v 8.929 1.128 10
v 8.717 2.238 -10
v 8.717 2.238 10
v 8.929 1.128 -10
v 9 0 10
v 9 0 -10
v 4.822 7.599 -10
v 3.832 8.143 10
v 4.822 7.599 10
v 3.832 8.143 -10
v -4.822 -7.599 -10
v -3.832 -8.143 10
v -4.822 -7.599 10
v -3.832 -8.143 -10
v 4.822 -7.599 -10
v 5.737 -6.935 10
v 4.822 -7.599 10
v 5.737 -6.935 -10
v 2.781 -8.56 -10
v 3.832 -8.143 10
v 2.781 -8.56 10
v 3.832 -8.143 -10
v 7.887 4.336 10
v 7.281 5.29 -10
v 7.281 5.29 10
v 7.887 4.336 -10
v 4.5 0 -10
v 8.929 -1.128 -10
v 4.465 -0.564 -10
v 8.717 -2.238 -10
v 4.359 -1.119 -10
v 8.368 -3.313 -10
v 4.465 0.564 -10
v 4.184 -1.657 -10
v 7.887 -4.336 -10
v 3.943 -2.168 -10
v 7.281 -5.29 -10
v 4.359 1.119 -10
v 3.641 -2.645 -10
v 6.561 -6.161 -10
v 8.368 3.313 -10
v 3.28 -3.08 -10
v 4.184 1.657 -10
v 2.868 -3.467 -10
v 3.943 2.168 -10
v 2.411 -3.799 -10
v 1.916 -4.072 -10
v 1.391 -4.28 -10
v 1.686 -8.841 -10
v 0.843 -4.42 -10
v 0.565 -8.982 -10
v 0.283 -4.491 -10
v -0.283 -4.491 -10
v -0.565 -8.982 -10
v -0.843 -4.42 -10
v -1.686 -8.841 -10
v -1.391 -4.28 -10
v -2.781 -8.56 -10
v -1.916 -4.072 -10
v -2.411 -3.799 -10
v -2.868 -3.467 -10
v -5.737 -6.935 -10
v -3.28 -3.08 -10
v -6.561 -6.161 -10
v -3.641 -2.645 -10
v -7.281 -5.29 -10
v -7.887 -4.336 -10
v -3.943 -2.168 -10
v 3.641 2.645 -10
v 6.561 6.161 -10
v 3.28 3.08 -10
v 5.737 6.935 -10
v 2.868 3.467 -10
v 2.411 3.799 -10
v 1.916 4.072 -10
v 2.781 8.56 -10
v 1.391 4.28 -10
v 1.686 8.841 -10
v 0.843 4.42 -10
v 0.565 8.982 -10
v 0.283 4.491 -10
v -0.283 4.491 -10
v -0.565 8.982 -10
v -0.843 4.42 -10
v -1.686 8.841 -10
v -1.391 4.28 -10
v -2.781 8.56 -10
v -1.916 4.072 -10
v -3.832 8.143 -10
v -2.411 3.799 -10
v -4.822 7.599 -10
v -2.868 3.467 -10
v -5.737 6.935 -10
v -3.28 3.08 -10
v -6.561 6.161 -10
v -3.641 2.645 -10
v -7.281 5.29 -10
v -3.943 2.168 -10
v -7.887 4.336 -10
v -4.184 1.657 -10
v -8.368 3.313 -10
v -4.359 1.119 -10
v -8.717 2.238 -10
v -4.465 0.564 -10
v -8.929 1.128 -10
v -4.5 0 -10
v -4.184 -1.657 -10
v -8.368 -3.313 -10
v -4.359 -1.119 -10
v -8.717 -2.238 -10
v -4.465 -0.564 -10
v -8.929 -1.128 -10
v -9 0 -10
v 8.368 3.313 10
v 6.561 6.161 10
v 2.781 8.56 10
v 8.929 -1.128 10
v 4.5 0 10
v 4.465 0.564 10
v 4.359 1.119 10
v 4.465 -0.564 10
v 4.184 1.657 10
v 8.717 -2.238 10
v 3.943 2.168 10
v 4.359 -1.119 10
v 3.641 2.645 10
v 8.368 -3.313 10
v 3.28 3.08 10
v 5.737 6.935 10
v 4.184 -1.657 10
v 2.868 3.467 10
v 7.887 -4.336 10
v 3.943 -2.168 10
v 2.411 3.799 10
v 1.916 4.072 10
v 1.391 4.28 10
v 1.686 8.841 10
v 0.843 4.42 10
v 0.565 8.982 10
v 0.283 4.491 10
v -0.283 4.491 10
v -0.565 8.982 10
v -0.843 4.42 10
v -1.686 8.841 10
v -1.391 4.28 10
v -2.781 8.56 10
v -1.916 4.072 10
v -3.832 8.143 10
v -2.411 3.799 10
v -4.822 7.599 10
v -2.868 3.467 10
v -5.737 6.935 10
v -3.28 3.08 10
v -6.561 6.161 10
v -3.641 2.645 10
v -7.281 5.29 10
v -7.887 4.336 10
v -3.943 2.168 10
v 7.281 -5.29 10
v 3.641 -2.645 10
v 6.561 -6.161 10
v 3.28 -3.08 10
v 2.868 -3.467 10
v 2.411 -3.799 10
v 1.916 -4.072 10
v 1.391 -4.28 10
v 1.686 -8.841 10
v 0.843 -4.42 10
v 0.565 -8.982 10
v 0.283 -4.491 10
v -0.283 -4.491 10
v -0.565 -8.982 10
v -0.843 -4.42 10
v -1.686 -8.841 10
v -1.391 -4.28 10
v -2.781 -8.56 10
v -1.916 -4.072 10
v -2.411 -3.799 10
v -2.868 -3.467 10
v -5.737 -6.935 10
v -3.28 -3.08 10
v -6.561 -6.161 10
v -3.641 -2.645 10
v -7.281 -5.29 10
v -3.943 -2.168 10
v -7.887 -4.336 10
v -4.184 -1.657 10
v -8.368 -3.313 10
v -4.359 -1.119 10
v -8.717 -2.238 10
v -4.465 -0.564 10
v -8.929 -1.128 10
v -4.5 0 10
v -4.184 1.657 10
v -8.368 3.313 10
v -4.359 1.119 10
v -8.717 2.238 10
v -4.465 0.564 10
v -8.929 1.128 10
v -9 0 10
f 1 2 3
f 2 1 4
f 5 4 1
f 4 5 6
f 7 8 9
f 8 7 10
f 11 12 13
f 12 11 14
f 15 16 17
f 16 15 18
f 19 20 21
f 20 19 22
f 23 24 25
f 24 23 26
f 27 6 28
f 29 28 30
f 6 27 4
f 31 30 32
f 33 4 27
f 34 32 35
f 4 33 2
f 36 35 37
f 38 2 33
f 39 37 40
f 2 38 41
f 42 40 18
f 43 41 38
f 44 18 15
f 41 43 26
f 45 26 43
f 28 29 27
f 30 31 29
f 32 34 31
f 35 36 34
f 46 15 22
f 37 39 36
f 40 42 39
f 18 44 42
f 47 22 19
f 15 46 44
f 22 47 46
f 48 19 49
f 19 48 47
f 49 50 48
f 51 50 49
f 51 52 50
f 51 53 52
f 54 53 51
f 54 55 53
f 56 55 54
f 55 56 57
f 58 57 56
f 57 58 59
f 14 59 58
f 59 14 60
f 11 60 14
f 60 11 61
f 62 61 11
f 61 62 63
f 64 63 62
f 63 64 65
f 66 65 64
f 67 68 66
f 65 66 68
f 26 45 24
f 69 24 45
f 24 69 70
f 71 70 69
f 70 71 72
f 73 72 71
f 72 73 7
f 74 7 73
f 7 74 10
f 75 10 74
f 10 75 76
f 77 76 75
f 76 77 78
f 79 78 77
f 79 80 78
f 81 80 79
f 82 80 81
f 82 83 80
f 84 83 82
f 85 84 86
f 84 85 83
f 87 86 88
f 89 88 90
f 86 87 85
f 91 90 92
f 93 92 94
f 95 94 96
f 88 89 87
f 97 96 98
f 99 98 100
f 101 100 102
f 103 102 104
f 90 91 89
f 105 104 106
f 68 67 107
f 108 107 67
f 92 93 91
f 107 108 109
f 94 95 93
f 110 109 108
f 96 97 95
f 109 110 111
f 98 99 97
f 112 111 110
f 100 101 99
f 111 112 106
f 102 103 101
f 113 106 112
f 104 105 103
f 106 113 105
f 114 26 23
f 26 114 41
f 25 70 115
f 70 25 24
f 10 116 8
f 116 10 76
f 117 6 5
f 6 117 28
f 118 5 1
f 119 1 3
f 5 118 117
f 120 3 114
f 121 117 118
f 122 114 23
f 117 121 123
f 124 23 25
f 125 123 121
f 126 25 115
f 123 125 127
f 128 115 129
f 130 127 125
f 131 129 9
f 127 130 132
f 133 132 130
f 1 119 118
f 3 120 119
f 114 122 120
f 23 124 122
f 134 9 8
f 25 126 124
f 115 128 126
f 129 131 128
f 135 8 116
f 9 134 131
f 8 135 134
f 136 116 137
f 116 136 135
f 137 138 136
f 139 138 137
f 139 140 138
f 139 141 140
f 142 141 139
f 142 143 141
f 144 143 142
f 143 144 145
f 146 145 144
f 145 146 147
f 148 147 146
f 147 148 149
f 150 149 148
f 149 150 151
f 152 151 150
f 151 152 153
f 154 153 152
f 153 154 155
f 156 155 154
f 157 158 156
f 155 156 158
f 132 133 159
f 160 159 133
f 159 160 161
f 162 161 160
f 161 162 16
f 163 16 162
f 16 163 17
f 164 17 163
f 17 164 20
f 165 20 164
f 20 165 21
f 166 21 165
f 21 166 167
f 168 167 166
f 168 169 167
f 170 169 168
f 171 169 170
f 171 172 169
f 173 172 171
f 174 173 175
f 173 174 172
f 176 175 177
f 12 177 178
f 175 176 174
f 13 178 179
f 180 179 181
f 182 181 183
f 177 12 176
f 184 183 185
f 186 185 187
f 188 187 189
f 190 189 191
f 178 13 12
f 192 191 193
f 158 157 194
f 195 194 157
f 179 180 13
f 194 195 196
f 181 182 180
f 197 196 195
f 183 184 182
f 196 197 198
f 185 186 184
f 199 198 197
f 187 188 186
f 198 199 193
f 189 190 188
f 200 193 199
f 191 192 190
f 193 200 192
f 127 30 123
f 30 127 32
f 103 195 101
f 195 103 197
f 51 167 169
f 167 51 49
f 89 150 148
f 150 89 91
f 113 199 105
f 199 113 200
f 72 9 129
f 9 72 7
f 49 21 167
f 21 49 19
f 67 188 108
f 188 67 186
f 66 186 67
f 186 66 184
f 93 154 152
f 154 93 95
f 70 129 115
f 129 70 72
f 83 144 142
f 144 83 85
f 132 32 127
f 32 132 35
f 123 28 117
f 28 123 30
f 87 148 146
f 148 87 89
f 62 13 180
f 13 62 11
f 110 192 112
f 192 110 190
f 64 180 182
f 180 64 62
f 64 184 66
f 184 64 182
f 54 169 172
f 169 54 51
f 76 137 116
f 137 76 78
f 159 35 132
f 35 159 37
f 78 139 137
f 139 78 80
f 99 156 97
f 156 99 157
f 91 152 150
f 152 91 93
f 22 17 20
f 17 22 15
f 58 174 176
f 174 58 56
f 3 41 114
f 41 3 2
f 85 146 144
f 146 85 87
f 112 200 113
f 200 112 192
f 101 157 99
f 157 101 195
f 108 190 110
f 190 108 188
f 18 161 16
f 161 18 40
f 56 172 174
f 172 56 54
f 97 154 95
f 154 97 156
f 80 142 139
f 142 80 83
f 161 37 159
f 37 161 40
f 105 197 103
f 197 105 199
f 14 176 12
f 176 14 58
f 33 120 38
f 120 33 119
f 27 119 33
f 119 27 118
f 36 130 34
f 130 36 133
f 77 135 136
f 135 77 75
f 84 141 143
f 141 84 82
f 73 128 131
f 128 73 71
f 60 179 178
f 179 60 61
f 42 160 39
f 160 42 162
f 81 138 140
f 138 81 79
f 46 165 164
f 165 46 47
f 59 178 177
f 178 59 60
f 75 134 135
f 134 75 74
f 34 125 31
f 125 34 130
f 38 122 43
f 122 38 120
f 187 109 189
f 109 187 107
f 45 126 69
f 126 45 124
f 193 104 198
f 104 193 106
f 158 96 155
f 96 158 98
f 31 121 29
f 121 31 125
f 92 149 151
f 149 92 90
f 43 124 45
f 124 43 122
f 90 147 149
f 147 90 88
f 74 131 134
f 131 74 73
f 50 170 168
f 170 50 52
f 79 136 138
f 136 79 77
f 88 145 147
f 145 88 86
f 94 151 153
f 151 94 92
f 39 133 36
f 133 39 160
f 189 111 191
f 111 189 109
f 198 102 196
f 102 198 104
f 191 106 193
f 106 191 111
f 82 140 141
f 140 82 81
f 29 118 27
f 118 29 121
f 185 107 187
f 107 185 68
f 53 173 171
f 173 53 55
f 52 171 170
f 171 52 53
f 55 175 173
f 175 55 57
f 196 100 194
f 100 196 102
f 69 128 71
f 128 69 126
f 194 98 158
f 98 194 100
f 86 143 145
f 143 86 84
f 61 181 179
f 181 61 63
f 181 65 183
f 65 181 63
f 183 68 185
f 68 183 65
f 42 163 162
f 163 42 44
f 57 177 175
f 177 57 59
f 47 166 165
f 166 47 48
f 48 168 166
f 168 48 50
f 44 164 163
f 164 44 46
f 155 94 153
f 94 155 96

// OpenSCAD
$fn = 50;


difference() {
	union() {
		translate(v = [0, 0, -10.0000000000]) {
			cylinder(h = 20, r = 9.0000000000);
		}
	}
	union() {
		translate(v = [0, 0, -100.0000000000]) {
			cylinder(h = 200, r = 4.5000000000);
		}
	}
}
